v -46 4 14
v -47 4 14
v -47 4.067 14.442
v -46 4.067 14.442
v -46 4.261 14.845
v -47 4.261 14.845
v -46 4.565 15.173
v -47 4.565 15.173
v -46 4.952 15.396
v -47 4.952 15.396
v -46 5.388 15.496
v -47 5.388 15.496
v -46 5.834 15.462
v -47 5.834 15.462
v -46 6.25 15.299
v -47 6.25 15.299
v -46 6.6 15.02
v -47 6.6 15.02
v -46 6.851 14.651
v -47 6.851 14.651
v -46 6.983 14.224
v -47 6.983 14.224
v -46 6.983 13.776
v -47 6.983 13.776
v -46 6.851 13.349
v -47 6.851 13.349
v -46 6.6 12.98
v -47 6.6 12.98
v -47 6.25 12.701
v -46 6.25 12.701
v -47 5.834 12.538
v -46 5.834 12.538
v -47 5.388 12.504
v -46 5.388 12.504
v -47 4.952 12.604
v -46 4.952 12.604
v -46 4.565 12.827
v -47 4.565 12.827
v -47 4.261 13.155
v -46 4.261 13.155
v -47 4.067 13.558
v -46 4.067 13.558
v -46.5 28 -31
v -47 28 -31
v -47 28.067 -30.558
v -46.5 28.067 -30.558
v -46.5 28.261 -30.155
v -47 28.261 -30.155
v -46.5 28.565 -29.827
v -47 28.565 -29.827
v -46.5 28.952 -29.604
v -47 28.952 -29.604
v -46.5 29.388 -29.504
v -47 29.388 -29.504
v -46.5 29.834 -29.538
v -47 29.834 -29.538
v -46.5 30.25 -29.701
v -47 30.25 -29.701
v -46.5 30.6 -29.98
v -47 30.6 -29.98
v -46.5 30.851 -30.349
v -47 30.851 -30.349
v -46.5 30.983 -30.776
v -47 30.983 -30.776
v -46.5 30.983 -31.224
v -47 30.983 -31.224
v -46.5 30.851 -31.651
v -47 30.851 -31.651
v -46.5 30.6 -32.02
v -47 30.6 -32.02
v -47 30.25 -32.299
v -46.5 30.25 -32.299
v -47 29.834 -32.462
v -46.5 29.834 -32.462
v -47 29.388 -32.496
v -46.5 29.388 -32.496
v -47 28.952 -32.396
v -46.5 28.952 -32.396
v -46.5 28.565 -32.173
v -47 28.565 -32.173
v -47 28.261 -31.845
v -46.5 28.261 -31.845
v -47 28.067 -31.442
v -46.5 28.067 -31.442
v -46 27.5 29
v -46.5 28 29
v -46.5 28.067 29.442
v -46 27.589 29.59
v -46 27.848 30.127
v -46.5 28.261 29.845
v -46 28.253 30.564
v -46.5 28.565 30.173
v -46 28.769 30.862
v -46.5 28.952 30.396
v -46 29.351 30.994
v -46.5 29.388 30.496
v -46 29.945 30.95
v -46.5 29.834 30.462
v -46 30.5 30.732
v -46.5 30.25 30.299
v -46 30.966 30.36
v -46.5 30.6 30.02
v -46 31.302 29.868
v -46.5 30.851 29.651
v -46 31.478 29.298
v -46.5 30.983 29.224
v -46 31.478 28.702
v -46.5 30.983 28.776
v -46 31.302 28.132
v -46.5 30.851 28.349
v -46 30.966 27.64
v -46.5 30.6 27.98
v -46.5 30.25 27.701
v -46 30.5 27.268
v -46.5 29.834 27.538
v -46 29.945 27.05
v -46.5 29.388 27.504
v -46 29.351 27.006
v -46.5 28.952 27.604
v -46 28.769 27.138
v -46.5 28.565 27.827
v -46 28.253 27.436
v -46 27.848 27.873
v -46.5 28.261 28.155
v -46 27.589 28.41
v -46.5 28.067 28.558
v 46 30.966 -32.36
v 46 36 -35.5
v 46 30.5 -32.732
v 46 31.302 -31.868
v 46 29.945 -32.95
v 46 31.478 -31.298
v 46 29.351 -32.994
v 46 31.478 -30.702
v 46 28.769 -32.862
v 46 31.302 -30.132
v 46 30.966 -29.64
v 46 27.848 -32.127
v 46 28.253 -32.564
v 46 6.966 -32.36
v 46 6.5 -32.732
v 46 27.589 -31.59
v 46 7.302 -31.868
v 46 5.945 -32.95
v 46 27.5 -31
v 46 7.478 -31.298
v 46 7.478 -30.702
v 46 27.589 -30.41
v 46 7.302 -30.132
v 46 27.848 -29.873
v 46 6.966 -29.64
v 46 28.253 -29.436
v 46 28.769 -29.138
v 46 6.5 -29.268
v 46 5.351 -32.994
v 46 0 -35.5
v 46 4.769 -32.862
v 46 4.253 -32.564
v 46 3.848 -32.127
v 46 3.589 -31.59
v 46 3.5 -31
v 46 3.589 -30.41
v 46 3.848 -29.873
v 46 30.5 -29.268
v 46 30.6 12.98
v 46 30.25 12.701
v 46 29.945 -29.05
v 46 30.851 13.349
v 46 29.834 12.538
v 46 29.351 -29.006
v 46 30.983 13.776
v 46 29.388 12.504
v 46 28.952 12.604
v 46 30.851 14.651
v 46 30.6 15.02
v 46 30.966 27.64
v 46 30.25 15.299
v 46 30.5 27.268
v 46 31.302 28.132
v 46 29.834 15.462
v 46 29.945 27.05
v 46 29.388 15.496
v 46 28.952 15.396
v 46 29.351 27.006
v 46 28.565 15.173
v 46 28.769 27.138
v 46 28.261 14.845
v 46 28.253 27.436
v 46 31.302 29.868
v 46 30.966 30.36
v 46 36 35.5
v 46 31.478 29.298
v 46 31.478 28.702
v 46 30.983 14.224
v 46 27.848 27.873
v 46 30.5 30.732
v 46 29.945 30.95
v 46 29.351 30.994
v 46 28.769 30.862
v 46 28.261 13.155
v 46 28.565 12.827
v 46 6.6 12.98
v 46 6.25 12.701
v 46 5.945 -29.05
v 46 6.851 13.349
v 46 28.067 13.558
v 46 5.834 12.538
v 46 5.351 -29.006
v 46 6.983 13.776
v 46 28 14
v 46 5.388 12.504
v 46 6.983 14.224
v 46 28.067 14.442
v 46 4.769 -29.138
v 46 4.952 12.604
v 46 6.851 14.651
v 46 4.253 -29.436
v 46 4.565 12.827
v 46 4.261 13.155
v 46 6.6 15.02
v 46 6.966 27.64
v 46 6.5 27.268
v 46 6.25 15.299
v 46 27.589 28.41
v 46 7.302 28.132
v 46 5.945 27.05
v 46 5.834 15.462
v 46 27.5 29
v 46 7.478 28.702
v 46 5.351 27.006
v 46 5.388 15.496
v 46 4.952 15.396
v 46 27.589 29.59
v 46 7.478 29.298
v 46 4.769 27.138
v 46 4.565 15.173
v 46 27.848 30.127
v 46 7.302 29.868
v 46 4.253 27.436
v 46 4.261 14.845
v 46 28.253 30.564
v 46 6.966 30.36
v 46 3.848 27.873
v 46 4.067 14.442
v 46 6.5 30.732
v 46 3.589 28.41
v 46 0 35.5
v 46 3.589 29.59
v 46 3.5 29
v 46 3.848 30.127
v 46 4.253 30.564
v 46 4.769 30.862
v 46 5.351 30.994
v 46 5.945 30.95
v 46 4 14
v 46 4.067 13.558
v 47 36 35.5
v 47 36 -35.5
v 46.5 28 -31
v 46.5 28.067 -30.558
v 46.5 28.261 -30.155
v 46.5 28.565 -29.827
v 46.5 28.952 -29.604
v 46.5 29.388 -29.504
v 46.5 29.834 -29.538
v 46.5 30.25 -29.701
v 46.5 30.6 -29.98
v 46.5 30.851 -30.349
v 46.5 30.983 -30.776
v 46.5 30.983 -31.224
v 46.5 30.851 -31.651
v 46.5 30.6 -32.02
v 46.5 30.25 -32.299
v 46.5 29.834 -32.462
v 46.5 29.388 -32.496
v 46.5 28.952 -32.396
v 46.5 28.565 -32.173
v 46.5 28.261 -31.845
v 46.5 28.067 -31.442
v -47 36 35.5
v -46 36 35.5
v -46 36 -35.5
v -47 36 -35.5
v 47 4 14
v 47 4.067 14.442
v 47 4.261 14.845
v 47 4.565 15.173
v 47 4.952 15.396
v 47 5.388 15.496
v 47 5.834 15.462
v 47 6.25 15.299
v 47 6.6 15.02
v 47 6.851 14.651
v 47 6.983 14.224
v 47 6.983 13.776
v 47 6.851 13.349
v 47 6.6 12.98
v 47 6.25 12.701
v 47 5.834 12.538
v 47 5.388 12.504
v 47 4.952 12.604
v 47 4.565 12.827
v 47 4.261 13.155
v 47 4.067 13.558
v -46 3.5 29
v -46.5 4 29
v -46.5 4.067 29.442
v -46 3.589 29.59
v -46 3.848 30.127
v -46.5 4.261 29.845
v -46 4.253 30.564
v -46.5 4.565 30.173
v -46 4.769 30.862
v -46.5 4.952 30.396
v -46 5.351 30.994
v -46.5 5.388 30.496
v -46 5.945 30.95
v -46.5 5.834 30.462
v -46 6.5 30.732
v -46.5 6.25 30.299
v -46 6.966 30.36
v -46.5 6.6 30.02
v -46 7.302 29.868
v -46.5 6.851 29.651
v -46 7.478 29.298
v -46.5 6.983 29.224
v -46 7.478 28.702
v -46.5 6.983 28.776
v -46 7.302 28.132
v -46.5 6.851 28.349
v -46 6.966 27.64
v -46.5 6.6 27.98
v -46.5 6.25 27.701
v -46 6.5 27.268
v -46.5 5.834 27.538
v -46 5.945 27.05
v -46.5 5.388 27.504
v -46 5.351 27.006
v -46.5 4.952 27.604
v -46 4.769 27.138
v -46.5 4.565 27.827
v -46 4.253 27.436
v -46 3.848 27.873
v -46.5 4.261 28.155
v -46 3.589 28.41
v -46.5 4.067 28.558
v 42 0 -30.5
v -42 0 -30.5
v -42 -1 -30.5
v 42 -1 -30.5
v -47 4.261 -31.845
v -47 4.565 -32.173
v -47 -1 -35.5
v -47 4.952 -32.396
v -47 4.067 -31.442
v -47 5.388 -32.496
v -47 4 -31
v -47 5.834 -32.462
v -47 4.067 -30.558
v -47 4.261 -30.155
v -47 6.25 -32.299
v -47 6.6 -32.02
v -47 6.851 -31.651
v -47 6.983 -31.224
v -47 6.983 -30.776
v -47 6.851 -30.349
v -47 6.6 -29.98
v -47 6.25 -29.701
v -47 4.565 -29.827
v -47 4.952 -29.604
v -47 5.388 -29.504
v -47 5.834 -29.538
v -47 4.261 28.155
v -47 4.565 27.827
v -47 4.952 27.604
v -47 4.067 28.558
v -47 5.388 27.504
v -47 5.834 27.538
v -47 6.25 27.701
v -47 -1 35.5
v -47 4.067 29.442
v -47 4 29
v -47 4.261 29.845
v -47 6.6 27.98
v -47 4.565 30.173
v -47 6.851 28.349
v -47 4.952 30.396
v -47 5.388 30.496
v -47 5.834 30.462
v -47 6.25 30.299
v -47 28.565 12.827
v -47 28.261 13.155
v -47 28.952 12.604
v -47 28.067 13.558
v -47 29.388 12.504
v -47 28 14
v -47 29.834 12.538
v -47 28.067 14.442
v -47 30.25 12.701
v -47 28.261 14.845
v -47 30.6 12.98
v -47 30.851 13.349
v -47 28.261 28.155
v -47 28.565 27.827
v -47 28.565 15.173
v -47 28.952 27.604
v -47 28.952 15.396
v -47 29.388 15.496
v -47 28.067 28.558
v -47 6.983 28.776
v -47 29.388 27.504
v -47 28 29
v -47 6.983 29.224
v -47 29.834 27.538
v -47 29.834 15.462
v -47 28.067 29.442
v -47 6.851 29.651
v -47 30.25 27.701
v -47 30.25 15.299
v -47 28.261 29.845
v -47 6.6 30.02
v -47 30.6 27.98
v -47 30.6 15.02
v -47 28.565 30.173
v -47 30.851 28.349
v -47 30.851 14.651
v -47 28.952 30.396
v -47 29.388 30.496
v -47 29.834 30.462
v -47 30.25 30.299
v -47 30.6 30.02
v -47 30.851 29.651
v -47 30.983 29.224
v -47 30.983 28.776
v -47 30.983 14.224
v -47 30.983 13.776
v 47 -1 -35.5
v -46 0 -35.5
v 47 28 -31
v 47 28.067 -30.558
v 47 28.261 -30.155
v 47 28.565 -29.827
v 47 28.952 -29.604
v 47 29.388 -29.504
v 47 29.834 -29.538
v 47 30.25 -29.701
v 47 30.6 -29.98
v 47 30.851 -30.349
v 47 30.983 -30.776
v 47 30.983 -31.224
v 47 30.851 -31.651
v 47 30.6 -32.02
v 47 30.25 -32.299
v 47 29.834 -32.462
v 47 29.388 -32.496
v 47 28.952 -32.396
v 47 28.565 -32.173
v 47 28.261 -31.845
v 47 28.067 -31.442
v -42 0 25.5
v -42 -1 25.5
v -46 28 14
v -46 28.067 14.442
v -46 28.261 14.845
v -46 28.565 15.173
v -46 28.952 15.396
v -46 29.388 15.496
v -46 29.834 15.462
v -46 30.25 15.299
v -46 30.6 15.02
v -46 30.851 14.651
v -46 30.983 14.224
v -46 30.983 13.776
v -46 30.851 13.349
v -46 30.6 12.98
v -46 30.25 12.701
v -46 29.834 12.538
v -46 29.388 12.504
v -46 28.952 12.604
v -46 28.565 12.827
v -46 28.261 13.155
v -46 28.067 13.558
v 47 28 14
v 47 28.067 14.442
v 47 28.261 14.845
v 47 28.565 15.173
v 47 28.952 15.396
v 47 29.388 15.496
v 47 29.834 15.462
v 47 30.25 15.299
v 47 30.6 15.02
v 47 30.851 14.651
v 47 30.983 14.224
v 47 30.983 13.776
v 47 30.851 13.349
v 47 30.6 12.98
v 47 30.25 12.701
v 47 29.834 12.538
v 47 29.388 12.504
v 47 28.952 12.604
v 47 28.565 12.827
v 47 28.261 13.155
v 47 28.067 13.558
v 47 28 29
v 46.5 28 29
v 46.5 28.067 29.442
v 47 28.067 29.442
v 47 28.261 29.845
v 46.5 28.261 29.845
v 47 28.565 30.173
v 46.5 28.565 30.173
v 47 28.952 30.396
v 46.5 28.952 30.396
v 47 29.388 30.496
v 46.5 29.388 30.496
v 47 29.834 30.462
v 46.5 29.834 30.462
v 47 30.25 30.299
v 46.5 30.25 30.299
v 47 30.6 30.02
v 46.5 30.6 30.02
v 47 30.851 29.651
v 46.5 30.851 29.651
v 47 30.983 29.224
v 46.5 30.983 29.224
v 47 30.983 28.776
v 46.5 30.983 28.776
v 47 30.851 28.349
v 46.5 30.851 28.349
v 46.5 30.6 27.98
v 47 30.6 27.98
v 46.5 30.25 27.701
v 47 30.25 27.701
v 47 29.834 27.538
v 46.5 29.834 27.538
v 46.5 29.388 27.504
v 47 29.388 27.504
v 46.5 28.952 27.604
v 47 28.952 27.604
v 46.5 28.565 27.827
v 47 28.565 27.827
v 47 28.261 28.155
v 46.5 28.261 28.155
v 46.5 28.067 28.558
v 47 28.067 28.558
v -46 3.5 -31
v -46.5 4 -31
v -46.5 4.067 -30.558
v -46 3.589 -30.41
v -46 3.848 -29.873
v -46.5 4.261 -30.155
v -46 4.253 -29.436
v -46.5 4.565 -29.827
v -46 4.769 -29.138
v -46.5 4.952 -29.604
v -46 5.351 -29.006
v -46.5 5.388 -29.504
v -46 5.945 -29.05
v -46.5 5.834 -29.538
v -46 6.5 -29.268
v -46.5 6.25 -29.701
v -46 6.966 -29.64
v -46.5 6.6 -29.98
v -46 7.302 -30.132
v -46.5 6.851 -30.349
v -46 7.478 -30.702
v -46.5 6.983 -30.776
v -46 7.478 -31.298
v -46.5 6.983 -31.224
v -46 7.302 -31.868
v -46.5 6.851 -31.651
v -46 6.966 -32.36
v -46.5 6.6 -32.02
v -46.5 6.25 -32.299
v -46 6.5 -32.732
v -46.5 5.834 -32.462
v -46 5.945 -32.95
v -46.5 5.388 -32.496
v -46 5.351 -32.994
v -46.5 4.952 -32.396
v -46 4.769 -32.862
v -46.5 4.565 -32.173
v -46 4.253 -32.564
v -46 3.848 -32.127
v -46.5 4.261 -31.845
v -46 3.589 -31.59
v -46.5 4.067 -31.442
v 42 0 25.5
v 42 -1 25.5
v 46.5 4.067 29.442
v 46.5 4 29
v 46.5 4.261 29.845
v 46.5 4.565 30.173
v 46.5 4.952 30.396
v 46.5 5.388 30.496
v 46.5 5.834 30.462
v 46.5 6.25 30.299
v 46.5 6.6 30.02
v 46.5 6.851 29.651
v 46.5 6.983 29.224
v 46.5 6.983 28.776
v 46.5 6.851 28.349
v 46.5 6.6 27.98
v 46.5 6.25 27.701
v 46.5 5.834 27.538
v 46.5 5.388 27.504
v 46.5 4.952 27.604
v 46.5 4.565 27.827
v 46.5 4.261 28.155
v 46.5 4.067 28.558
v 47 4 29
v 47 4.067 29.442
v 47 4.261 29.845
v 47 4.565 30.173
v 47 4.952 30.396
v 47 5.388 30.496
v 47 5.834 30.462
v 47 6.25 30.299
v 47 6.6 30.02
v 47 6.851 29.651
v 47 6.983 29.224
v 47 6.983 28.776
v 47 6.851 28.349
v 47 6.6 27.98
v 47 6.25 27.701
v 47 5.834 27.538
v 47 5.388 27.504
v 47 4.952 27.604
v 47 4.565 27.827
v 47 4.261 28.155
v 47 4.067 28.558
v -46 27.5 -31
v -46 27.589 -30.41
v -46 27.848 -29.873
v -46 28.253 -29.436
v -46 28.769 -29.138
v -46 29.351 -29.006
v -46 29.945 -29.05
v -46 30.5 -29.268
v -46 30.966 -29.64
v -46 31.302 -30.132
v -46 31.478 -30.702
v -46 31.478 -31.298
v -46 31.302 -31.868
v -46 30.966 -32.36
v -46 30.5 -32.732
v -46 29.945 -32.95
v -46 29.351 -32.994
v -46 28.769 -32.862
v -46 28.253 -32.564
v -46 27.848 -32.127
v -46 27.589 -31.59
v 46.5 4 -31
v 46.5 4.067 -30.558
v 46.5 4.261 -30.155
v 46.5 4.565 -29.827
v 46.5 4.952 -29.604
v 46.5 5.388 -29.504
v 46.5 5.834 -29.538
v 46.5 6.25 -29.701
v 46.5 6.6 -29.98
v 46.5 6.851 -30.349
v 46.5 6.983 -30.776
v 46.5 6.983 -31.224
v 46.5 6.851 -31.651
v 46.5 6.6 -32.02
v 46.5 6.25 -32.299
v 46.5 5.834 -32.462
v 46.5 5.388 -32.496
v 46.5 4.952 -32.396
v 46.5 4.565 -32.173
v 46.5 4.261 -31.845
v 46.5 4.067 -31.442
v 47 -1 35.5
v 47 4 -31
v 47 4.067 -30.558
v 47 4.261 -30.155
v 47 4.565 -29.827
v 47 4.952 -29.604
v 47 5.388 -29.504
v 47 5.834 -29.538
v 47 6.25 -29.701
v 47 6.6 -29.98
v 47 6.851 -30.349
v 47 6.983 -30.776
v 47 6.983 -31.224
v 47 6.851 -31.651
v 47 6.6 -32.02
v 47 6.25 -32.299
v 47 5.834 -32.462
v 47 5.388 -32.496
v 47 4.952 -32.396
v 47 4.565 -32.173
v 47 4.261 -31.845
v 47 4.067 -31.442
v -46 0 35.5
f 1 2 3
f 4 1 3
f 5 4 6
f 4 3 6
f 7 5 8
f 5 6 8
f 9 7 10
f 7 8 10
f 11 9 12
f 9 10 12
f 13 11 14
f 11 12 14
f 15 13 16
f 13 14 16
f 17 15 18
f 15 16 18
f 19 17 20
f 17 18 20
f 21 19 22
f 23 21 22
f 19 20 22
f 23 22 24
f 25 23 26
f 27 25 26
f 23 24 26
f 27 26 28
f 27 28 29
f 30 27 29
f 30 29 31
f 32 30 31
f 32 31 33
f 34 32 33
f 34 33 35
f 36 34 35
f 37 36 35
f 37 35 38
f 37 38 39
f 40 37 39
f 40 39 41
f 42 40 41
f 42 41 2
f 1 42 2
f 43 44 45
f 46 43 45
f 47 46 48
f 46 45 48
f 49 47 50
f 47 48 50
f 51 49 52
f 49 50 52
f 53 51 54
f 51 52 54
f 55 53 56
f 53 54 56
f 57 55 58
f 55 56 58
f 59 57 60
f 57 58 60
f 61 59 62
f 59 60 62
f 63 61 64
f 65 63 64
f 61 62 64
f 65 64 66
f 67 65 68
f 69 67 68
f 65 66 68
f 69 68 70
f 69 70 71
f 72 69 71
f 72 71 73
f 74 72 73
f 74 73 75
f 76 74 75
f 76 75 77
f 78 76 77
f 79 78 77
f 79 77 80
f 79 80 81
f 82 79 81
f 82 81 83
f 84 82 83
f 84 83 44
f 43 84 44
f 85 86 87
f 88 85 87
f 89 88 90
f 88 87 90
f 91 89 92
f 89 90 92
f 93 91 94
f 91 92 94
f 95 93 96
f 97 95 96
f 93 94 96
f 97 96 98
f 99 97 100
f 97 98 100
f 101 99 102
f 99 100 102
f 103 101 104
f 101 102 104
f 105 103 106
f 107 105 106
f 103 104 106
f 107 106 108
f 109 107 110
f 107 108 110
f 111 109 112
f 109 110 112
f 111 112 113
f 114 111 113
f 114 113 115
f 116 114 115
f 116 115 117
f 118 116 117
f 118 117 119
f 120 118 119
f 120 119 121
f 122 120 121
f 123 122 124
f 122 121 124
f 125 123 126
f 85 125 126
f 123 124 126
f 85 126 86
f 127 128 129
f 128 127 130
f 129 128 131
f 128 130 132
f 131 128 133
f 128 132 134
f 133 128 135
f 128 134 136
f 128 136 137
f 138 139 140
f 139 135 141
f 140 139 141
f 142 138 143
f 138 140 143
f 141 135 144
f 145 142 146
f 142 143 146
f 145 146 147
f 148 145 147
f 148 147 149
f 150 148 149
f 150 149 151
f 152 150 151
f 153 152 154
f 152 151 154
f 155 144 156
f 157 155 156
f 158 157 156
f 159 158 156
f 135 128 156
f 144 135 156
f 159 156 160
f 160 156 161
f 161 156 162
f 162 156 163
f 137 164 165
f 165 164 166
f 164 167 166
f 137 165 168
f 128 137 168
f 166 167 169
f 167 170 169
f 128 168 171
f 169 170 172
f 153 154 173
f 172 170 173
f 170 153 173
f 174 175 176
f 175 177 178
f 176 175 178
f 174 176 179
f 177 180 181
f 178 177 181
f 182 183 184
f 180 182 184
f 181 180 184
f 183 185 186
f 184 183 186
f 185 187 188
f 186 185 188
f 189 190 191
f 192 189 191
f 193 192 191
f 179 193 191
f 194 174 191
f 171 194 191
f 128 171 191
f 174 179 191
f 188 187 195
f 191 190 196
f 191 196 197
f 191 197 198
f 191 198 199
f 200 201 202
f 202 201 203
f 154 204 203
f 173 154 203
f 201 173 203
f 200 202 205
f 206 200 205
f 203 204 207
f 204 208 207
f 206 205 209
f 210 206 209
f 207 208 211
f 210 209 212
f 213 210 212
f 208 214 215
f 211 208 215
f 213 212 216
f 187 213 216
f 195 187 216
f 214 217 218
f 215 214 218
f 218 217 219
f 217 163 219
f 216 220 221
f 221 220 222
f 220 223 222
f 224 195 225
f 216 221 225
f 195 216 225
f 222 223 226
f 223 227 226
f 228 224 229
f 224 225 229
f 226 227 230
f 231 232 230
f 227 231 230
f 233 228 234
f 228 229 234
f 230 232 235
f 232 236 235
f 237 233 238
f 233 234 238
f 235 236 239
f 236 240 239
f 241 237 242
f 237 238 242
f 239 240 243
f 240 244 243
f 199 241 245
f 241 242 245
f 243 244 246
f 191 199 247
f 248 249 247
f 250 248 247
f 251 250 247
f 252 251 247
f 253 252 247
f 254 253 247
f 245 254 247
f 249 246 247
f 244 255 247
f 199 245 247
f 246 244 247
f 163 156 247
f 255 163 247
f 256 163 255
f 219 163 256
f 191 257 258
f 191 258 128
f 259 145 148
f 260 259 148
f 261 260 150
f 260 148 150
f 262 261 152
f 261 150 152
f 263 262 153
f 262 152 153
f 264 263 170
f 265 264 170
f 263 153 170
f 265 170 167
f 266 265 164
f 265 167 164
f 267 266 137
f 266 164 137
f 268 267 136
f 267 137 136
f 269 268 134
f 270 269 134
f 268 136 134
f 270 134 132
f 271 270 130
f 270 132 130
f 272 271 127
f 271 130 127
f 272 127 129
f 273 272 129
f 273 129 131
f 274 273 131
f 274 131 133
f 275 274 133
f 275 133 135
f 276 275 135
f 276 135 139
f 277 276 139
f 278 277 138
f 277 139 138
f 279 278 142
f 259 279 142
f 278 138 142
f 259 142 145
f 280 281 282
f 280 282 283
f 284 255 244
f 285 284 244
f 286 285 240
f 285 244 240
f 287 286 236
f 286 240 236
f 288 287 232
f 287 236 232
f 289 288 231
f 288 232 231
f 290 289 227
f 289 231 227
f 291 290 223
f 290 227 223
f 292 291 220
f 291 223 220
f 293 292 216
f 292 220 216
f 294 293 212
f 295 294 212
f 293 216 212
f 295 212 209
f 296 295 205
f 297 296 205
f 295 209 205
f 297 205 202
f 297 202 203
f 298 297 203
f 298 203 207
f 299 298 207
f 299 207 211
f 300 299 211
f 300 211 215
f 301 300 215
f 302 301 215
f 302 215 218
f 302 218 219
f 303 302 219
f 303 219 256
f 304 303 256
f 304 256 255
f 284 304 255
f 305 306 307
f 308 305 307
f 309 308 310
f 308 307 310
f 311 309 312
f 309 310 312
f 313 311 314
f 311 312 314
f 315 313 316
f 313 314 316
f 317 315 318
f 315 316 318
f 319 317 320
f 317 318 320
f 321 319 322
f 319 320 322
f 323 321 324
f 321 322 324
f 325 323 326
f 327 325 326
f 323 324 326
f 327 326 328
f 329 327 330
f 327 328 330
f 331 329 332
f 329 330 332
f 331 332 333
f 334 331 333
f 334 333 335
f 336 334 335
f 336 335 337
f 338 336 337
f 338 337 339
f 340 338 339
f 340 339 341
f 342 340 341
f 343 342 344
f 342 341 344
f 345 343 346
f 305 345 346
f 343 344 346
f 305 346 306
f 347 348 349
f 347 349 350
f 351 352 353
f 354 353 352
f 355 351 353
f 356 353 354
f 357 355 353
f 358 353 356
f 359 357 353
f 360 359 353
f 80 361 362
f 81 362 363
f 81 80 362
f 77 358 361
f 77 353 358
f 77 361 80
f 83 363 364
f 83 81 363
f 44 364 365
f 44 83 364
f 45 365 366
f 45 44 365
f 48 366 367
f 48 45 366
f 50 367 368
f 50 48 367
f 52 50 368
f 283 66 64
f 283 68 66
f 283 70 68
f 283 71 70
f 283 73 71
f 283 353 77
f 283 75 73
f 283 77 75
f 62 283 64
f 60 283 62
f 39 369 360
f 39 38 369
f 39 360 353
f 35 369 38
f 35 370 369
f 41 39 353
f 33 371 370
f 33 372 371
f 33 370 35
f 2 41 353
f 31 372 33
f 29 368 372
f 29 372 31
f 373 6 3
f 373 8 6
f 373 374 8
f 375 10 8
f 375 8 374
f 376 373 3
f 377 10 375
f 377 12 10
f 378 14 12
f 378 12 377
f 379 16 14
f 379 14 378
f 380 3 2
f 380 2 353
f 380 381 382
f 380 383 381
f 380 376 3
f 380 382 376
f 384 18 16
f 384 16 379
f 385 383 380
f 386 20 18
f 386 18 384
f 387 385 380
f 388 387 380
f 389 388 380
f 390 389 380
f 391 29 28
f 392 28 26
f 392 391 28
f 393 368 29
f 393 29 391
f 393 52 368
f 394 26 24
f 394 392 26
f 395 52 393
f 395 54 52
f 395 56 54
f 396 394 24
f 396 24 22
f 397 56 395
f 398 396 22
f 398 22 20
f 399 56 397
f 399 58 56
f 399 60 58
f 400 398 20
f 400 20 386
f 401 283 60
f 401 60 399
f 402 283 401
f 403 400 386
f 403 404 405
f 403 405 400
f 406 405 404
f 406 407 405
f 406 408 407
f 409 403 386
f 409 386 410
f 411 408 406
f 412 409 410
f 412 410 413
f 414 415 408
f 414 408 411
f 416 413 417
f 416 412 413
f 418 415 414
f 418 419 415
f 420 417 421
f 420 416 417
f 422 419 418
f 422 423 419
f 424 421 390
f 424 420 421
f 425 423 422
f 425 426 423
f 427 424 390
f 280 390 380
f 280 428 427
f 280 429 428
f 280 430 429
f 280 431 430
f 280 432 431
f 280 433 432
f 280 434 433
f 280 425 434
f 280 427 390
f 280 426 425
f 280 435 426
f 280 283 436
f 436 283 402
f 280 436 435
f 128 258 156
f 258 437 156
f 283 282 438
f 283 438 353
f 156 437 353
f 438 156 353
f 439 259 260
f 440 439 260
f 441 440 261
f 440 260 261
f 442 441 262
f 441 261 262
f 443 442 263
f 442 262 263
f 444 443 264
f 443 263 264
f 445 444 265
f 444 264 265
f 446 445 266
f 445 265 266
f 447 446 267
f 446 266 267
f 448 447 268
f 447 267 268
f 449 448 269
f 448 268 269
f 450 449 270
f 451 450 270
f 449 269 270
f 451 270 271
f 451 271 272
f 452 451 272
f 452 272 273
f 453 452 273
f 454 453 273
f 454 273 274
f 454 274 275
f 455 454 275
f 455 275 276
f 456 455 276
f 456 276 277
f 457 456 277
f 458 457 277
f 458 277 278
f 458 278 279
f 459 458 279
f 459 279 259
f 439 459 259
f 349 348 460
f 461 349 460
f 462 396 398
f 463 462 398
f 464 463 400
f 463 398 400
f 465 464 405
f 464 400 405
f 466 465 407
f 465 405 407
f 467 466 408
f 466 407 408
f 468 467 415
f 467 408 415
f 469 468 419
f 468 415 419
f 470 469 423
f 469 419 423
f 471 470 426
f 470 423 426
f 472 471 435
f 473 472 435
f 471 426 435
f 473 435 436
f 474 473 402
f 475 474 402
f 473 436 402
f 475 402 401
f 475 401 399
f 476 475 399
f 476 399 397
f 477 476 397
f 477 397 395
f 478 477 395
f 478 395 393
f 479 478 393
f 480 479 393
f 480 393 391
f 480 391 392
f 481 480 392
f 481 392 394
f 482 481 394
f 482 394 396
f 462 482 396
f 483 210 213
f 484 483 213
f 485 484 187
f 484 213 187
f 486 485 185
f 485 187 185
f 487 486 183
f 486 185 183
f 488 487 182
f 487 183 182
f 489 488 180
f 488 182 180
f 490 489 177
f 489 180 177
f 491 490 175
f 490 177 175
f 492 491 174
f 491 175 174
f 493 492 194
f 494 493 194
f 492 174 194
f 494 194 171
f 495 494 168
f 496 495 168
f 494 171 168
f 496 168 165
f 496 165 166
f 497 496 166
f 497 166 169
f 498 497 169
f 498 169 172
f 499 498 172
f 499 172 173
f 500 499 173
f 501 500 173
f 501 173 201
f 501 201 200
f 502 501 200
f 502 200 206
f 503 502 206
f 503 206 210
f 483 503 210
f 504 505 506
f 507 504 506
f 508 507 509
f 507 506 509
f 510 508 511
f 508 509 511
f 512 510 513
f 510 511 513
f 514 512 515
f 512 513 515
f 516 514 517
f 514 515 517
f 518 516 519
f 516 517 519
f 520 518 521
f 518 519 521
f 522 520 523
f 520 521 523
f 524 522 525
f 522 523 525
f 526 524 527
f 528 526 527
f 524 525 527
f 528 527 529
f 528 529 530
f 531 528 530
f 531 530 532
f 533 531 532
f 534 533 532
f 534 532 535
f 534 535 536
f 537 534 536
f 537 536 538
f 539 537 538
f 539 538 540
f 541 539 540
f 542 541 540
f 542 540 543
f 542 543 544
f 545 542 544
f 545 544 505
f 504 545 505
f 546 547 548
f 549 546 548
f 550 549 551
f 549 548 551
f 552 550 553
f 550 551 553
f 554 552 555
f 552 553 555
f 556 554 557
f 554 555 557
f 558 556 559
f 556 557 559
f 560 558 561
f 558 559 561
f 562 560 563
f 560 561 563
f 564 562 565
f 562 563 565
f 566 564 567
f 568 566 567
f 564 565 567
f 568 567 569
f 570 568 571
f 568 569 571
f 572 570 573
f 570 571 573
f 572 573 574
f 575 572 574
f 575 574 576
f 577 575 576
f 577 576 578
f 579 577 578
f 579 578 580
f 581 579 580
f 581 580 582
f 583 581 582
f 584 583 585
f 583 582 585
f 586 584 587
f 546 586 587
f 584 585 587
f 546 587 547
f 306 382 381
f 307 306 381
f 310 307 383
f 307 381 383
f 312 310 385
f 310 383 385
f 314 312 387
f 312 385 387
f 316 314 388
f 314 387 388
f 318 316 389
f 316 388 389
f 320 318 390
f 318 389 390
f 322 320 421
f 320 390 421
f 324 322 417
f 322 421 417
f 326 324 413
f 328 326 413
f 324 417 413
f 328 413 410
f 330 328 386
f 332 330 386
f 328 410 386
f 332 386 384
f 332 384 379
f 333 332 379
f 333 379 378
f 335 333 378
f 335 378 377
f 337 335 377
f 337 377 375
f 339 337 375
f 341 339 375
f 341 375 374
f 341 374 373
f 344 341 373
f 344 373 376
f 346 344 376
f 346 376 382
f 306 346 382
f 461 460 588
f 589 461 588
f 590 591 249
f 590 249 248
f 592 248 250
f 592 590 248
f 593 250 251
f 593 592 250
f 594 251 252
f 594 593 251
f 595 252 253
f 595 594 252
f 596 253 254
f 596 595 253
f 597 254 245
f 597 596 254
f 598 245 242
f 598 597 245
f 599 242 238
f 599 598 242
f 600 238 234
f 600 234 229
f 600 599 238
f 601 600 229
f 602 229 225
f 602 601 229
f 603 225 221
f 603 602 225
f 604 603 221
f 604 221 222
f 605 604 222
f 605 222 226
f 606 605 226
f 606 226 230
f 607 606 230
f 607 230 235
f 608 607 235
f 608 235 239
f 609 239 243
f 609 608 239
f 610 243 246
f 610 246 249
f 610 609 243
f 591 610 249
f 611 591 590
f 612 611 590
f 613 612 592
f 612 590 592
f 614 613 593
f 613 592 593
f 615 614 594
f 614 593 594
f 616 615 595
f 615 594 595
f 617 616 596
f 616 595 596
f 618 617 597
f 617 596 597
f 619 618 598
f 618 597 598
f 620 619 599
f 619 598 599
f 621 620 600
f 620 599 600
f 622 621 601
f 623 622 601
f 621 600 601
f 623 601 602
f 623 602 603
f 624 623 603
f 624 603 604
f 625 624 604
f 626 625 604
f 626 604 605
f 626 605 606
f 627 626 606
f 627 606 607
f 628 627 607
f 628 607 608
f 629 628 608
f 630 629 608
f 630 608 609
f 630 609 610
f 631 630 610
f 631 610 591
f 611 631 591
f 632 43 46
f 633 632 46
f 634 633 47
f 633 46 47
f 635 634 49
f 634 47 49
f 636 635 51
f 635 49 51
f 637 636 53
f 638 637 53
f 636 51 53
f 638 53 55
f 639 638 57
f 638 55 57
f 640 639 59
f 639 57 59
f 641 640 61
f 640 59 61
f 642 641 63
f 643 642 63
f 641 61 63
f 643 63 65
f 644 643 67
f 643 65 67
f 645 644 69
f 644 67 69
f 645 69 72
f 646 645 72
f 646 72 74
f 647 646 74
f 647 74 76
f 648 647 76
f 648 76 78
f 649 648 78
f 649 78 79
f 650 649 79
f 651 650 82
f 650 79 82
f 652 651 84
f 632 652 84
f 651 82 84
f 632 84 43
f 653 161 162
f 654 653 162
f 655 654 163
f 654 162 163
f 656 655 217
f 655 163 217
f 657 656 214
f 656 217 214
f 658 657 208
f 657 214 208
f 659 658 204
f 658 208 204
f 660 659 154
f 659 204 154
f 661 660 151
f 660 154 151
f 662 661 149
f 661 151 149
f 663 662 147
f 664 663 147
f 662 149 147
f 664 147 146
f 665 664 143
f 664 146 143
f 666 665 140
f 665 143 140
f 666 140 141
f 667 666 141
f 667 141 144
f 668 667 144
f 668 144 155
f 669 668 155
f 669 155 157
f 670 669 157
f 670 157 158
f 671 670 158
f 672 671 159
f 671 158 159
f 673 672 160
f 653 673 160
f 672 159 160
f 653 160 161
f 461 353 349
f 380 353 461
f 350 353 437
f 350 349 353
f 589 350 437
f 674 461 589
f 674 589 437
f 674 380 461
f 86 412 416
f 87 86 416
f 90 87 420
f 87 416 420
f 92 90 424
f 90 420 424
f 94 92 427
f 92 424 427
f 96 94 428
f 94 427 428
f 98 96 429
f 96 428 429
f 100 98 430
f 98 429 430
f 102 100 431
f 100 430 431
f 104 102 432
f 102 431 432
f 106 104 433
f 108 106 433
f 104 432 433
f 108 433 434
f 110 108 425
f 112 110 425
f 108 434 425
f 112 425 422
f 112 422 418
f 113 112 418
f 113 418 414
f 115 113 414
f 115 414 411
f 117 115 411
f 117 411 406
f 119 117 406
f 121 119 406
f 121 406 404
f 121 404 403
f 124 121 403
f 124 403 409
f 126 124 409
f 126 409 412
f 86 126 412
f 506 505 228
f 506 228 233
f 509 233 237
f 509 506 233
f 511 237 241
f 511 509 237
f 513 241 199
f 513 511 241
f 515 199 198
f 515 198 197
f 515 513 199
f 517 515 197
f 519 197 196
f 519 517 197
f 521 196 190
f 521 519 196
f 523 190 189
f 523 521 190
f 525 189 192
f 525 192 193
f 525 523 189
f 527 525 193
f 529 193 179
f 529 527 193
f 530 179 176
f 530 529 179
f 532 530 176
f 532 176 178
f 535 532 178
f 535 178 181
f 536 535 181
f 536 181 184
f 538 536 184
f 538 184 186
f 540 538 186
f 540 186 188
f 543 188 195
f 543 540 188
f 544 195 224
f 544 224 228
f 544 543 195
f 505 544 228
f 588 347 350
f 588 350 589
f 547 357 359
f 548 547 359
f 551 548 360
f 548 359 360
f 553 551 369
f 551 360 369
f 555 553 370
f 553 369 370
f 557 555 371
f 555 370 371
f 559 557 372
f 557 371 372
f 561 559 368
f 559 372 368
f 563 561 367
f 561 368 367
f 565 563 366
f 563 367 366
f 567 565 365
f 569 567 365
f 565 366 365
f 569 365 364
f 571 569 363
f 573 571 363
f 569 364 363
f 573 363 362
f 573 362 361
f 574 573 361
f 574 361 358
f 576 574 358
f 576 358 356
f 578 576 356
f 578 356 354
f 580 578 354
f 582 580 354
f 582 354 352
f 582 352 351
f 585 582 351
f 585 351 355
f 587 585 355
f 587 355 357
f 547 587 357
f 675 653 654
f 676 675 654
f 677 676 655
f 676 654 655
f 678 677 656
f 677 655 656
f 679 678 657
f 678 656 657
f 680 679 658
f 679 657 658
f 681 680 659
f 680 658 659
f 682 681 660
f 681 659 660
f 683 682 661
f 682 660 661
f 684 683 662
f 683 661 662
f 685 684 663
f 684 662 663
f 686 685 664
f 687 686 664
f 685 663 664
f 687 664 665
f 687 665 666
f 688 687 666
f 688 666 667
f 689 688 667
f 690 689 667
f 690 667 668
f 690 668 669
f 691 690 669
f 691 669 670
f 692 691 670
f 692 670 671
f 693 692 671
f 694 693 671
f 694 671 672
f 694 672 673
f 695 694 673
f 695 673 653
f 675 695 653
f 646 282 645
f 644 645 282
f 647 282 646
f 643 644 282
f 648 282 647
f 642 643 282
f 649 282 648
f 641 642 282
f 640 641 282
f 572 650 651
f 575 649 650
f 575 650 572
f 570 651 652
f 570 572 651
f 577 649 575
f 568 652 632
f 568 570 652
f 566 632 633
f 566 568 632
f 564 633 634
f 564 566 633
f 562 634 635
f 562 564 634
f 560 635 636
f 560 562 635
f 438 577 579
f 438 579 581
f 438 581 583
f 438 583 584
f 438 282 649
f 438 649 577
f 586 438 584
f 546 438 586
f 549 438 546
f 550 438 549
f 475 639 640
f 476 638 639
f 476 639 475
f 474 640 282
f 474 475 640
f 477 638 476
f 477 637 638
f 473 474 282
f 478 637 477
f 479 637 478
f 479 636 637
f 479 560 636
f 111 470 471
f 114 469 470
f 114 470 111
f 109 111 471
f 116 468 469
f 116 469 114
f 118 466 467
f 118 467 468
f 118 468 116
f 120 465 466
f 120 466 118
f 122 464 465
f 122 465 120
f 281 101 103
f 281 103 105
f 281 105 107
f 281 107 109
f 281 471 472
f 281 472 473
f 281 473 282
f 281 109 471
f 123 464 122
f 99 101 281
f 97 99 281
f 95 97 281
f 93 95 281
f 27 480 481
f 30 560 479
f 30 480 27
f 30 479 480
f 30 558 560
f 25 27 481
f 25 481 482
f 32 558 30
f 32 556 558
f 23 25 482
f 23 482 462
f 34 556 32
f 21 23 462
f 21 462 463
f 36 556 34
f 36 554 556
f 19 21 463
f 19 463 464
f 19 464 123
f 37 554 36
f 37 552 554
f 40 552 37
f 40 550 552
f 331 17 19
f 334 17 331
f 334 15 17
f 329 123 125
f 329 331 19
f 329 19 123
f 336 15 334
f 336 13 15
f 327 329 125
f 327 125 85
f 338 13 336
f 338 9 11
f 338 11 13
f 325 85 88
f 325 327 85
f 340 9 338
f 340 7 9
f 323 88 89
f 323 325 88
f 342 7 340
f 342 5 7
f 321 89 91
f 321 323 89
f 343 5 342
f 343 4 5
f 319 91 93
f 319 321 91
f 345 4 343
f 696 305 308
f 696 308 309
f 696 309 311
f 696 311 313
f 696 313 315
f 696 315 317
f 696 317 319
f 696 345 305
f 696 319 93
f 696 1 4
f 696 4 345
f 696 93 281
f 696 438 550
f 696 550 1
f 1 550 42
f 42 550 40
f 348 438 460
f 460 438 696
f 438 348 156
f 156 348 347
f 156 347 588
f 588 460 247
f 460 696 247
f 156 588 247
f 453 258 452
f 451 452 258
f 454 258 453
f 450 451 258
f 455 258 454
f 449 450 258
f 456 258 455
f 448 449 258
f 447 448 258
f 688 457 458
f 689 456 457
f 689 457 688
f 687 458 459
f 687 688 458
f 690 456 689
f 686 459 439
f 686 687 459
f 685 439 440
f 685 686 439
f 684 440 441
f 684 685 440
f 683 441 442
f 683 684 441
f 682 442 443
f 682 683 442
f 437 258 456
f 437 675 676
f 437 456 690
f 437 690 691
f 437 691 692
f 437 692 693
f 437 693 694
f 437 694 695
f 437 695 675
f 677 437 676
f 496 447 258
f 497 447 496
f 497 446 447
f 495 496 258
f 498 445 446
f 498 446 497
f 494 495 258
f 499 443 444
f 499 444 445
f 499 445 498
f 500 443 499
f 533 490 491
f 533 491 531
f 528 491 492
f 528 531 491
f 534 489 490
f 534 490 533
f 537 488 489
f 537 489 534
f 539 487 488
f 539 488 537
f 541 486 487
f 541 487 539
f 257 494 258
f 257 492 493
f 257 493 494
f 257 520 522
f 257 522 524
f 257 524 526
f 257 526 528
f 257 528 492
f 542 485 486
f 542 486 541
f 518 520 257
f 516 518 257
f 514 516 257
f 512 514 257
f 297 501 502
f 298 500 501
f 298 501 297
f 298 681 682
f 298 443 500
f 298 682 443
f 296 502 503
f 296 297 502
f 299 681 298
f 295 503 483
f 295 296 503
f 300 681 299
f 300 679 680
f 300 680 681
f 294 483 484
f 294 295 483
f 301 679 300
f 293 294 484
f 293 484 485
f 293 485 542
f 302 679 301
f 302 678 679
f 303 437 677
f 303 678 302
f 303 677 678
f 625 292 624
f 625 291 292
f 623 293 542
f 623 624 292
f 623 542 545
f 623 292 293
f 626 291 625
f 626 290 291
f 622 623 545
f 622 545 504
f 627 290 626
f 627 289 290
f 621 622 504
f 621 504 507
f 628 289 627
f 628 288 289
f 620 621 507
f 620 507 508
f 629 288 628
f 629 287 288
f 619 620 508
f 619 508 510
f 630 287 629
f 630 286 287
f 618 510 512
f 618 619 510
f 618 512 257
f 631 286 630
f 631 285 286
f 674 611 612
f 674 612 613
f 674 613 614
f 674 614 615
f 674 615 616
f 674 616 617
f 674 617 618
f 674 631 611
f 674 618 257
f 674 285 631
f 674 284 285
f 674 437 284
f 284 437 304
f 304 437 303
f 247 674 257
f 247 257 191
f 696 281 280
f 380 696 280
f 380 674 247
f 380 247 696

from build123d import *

# Parameters (mm, degrees)
F0_W     = 94
F0_H     = 71
F0_W_2   = 84
F0_H_2   = 56
F1_DEPTH = 1
F2_W     = 1
F2_H     = 71
F3_DEPTH = 36
F4_R     = 1.5
F5_DEPTH = 100
F6_SIZE  = 0.5
F7_SIZE  = 0.5


with BuildPart() as f1:
    # F0 (on Front) → F1 (new body)
    with BuildSketch(Plane.XZ):
        Rectangle(F0_W, F0_H)
        with Locations((0, -2.5)):
            Rectangle(F0_W_2, F0_H_2, mode=Mode.SUBTRACT)
    extrude(amount=F1_DEPTH)

    # F2 (on face) → F3 (join)
    with BuildSketch(Plane(origin=(0, 0, 0), x_dir=(-1, 0, 0), z_dir=(0, 1, 0))):
        with Locations((-46.5, 0)):
            Rectangle(F2_W, F2_H)
        with Locations((46.5, 0)):
            Rectangle(F2_W, F2_H)
    extrude(amount=F3_DEPTH)

    # F4 (on face) → F5 (cut)
    with BuildSketch(Plane(origin=(-47, 0, 0), x_dir=(0, -1, 0), z_dir=(-1, 0, 0))):
        with Locations((-29.5, -31)):
            Circle(F4_R)
        with Locations((-5.5, -31)):
            Circle(F4_R)
        with Locations((-29.5, 29)):
            Circle(F4_R)
        with Locations((-5.5, 29)):
            Circle(F4_R)
        with Locations((-29.5, 14)):
            Circle(F4_R)
        with Locations((-5.5, 14)):
            Circle(F4_R)
    extrude(amount=-F5_DEPTH, mode=Mode.SUBTRACT)

    # F6
    f6_edges = [f1.edges().sort_by_distance(p)[0] for p in [
        (-46, 31, -31),
        (-46, 7, -31),
        (46, 7, -31),
        (46, 31, -31),
    ]]
    chamfer(f6_edges, length=F6_SIZE)

    # F7
    f7_edges = [f1.edges().sort_by_distance(p)[0] for p in [
        (46, 31, 29),
        (46, 7, 29),
        (-46, 7, 29),
        (-46, 31, 29),
    ]]
    chamfer(f7_edges, length=F7_SIZE)


solid = f1.part
